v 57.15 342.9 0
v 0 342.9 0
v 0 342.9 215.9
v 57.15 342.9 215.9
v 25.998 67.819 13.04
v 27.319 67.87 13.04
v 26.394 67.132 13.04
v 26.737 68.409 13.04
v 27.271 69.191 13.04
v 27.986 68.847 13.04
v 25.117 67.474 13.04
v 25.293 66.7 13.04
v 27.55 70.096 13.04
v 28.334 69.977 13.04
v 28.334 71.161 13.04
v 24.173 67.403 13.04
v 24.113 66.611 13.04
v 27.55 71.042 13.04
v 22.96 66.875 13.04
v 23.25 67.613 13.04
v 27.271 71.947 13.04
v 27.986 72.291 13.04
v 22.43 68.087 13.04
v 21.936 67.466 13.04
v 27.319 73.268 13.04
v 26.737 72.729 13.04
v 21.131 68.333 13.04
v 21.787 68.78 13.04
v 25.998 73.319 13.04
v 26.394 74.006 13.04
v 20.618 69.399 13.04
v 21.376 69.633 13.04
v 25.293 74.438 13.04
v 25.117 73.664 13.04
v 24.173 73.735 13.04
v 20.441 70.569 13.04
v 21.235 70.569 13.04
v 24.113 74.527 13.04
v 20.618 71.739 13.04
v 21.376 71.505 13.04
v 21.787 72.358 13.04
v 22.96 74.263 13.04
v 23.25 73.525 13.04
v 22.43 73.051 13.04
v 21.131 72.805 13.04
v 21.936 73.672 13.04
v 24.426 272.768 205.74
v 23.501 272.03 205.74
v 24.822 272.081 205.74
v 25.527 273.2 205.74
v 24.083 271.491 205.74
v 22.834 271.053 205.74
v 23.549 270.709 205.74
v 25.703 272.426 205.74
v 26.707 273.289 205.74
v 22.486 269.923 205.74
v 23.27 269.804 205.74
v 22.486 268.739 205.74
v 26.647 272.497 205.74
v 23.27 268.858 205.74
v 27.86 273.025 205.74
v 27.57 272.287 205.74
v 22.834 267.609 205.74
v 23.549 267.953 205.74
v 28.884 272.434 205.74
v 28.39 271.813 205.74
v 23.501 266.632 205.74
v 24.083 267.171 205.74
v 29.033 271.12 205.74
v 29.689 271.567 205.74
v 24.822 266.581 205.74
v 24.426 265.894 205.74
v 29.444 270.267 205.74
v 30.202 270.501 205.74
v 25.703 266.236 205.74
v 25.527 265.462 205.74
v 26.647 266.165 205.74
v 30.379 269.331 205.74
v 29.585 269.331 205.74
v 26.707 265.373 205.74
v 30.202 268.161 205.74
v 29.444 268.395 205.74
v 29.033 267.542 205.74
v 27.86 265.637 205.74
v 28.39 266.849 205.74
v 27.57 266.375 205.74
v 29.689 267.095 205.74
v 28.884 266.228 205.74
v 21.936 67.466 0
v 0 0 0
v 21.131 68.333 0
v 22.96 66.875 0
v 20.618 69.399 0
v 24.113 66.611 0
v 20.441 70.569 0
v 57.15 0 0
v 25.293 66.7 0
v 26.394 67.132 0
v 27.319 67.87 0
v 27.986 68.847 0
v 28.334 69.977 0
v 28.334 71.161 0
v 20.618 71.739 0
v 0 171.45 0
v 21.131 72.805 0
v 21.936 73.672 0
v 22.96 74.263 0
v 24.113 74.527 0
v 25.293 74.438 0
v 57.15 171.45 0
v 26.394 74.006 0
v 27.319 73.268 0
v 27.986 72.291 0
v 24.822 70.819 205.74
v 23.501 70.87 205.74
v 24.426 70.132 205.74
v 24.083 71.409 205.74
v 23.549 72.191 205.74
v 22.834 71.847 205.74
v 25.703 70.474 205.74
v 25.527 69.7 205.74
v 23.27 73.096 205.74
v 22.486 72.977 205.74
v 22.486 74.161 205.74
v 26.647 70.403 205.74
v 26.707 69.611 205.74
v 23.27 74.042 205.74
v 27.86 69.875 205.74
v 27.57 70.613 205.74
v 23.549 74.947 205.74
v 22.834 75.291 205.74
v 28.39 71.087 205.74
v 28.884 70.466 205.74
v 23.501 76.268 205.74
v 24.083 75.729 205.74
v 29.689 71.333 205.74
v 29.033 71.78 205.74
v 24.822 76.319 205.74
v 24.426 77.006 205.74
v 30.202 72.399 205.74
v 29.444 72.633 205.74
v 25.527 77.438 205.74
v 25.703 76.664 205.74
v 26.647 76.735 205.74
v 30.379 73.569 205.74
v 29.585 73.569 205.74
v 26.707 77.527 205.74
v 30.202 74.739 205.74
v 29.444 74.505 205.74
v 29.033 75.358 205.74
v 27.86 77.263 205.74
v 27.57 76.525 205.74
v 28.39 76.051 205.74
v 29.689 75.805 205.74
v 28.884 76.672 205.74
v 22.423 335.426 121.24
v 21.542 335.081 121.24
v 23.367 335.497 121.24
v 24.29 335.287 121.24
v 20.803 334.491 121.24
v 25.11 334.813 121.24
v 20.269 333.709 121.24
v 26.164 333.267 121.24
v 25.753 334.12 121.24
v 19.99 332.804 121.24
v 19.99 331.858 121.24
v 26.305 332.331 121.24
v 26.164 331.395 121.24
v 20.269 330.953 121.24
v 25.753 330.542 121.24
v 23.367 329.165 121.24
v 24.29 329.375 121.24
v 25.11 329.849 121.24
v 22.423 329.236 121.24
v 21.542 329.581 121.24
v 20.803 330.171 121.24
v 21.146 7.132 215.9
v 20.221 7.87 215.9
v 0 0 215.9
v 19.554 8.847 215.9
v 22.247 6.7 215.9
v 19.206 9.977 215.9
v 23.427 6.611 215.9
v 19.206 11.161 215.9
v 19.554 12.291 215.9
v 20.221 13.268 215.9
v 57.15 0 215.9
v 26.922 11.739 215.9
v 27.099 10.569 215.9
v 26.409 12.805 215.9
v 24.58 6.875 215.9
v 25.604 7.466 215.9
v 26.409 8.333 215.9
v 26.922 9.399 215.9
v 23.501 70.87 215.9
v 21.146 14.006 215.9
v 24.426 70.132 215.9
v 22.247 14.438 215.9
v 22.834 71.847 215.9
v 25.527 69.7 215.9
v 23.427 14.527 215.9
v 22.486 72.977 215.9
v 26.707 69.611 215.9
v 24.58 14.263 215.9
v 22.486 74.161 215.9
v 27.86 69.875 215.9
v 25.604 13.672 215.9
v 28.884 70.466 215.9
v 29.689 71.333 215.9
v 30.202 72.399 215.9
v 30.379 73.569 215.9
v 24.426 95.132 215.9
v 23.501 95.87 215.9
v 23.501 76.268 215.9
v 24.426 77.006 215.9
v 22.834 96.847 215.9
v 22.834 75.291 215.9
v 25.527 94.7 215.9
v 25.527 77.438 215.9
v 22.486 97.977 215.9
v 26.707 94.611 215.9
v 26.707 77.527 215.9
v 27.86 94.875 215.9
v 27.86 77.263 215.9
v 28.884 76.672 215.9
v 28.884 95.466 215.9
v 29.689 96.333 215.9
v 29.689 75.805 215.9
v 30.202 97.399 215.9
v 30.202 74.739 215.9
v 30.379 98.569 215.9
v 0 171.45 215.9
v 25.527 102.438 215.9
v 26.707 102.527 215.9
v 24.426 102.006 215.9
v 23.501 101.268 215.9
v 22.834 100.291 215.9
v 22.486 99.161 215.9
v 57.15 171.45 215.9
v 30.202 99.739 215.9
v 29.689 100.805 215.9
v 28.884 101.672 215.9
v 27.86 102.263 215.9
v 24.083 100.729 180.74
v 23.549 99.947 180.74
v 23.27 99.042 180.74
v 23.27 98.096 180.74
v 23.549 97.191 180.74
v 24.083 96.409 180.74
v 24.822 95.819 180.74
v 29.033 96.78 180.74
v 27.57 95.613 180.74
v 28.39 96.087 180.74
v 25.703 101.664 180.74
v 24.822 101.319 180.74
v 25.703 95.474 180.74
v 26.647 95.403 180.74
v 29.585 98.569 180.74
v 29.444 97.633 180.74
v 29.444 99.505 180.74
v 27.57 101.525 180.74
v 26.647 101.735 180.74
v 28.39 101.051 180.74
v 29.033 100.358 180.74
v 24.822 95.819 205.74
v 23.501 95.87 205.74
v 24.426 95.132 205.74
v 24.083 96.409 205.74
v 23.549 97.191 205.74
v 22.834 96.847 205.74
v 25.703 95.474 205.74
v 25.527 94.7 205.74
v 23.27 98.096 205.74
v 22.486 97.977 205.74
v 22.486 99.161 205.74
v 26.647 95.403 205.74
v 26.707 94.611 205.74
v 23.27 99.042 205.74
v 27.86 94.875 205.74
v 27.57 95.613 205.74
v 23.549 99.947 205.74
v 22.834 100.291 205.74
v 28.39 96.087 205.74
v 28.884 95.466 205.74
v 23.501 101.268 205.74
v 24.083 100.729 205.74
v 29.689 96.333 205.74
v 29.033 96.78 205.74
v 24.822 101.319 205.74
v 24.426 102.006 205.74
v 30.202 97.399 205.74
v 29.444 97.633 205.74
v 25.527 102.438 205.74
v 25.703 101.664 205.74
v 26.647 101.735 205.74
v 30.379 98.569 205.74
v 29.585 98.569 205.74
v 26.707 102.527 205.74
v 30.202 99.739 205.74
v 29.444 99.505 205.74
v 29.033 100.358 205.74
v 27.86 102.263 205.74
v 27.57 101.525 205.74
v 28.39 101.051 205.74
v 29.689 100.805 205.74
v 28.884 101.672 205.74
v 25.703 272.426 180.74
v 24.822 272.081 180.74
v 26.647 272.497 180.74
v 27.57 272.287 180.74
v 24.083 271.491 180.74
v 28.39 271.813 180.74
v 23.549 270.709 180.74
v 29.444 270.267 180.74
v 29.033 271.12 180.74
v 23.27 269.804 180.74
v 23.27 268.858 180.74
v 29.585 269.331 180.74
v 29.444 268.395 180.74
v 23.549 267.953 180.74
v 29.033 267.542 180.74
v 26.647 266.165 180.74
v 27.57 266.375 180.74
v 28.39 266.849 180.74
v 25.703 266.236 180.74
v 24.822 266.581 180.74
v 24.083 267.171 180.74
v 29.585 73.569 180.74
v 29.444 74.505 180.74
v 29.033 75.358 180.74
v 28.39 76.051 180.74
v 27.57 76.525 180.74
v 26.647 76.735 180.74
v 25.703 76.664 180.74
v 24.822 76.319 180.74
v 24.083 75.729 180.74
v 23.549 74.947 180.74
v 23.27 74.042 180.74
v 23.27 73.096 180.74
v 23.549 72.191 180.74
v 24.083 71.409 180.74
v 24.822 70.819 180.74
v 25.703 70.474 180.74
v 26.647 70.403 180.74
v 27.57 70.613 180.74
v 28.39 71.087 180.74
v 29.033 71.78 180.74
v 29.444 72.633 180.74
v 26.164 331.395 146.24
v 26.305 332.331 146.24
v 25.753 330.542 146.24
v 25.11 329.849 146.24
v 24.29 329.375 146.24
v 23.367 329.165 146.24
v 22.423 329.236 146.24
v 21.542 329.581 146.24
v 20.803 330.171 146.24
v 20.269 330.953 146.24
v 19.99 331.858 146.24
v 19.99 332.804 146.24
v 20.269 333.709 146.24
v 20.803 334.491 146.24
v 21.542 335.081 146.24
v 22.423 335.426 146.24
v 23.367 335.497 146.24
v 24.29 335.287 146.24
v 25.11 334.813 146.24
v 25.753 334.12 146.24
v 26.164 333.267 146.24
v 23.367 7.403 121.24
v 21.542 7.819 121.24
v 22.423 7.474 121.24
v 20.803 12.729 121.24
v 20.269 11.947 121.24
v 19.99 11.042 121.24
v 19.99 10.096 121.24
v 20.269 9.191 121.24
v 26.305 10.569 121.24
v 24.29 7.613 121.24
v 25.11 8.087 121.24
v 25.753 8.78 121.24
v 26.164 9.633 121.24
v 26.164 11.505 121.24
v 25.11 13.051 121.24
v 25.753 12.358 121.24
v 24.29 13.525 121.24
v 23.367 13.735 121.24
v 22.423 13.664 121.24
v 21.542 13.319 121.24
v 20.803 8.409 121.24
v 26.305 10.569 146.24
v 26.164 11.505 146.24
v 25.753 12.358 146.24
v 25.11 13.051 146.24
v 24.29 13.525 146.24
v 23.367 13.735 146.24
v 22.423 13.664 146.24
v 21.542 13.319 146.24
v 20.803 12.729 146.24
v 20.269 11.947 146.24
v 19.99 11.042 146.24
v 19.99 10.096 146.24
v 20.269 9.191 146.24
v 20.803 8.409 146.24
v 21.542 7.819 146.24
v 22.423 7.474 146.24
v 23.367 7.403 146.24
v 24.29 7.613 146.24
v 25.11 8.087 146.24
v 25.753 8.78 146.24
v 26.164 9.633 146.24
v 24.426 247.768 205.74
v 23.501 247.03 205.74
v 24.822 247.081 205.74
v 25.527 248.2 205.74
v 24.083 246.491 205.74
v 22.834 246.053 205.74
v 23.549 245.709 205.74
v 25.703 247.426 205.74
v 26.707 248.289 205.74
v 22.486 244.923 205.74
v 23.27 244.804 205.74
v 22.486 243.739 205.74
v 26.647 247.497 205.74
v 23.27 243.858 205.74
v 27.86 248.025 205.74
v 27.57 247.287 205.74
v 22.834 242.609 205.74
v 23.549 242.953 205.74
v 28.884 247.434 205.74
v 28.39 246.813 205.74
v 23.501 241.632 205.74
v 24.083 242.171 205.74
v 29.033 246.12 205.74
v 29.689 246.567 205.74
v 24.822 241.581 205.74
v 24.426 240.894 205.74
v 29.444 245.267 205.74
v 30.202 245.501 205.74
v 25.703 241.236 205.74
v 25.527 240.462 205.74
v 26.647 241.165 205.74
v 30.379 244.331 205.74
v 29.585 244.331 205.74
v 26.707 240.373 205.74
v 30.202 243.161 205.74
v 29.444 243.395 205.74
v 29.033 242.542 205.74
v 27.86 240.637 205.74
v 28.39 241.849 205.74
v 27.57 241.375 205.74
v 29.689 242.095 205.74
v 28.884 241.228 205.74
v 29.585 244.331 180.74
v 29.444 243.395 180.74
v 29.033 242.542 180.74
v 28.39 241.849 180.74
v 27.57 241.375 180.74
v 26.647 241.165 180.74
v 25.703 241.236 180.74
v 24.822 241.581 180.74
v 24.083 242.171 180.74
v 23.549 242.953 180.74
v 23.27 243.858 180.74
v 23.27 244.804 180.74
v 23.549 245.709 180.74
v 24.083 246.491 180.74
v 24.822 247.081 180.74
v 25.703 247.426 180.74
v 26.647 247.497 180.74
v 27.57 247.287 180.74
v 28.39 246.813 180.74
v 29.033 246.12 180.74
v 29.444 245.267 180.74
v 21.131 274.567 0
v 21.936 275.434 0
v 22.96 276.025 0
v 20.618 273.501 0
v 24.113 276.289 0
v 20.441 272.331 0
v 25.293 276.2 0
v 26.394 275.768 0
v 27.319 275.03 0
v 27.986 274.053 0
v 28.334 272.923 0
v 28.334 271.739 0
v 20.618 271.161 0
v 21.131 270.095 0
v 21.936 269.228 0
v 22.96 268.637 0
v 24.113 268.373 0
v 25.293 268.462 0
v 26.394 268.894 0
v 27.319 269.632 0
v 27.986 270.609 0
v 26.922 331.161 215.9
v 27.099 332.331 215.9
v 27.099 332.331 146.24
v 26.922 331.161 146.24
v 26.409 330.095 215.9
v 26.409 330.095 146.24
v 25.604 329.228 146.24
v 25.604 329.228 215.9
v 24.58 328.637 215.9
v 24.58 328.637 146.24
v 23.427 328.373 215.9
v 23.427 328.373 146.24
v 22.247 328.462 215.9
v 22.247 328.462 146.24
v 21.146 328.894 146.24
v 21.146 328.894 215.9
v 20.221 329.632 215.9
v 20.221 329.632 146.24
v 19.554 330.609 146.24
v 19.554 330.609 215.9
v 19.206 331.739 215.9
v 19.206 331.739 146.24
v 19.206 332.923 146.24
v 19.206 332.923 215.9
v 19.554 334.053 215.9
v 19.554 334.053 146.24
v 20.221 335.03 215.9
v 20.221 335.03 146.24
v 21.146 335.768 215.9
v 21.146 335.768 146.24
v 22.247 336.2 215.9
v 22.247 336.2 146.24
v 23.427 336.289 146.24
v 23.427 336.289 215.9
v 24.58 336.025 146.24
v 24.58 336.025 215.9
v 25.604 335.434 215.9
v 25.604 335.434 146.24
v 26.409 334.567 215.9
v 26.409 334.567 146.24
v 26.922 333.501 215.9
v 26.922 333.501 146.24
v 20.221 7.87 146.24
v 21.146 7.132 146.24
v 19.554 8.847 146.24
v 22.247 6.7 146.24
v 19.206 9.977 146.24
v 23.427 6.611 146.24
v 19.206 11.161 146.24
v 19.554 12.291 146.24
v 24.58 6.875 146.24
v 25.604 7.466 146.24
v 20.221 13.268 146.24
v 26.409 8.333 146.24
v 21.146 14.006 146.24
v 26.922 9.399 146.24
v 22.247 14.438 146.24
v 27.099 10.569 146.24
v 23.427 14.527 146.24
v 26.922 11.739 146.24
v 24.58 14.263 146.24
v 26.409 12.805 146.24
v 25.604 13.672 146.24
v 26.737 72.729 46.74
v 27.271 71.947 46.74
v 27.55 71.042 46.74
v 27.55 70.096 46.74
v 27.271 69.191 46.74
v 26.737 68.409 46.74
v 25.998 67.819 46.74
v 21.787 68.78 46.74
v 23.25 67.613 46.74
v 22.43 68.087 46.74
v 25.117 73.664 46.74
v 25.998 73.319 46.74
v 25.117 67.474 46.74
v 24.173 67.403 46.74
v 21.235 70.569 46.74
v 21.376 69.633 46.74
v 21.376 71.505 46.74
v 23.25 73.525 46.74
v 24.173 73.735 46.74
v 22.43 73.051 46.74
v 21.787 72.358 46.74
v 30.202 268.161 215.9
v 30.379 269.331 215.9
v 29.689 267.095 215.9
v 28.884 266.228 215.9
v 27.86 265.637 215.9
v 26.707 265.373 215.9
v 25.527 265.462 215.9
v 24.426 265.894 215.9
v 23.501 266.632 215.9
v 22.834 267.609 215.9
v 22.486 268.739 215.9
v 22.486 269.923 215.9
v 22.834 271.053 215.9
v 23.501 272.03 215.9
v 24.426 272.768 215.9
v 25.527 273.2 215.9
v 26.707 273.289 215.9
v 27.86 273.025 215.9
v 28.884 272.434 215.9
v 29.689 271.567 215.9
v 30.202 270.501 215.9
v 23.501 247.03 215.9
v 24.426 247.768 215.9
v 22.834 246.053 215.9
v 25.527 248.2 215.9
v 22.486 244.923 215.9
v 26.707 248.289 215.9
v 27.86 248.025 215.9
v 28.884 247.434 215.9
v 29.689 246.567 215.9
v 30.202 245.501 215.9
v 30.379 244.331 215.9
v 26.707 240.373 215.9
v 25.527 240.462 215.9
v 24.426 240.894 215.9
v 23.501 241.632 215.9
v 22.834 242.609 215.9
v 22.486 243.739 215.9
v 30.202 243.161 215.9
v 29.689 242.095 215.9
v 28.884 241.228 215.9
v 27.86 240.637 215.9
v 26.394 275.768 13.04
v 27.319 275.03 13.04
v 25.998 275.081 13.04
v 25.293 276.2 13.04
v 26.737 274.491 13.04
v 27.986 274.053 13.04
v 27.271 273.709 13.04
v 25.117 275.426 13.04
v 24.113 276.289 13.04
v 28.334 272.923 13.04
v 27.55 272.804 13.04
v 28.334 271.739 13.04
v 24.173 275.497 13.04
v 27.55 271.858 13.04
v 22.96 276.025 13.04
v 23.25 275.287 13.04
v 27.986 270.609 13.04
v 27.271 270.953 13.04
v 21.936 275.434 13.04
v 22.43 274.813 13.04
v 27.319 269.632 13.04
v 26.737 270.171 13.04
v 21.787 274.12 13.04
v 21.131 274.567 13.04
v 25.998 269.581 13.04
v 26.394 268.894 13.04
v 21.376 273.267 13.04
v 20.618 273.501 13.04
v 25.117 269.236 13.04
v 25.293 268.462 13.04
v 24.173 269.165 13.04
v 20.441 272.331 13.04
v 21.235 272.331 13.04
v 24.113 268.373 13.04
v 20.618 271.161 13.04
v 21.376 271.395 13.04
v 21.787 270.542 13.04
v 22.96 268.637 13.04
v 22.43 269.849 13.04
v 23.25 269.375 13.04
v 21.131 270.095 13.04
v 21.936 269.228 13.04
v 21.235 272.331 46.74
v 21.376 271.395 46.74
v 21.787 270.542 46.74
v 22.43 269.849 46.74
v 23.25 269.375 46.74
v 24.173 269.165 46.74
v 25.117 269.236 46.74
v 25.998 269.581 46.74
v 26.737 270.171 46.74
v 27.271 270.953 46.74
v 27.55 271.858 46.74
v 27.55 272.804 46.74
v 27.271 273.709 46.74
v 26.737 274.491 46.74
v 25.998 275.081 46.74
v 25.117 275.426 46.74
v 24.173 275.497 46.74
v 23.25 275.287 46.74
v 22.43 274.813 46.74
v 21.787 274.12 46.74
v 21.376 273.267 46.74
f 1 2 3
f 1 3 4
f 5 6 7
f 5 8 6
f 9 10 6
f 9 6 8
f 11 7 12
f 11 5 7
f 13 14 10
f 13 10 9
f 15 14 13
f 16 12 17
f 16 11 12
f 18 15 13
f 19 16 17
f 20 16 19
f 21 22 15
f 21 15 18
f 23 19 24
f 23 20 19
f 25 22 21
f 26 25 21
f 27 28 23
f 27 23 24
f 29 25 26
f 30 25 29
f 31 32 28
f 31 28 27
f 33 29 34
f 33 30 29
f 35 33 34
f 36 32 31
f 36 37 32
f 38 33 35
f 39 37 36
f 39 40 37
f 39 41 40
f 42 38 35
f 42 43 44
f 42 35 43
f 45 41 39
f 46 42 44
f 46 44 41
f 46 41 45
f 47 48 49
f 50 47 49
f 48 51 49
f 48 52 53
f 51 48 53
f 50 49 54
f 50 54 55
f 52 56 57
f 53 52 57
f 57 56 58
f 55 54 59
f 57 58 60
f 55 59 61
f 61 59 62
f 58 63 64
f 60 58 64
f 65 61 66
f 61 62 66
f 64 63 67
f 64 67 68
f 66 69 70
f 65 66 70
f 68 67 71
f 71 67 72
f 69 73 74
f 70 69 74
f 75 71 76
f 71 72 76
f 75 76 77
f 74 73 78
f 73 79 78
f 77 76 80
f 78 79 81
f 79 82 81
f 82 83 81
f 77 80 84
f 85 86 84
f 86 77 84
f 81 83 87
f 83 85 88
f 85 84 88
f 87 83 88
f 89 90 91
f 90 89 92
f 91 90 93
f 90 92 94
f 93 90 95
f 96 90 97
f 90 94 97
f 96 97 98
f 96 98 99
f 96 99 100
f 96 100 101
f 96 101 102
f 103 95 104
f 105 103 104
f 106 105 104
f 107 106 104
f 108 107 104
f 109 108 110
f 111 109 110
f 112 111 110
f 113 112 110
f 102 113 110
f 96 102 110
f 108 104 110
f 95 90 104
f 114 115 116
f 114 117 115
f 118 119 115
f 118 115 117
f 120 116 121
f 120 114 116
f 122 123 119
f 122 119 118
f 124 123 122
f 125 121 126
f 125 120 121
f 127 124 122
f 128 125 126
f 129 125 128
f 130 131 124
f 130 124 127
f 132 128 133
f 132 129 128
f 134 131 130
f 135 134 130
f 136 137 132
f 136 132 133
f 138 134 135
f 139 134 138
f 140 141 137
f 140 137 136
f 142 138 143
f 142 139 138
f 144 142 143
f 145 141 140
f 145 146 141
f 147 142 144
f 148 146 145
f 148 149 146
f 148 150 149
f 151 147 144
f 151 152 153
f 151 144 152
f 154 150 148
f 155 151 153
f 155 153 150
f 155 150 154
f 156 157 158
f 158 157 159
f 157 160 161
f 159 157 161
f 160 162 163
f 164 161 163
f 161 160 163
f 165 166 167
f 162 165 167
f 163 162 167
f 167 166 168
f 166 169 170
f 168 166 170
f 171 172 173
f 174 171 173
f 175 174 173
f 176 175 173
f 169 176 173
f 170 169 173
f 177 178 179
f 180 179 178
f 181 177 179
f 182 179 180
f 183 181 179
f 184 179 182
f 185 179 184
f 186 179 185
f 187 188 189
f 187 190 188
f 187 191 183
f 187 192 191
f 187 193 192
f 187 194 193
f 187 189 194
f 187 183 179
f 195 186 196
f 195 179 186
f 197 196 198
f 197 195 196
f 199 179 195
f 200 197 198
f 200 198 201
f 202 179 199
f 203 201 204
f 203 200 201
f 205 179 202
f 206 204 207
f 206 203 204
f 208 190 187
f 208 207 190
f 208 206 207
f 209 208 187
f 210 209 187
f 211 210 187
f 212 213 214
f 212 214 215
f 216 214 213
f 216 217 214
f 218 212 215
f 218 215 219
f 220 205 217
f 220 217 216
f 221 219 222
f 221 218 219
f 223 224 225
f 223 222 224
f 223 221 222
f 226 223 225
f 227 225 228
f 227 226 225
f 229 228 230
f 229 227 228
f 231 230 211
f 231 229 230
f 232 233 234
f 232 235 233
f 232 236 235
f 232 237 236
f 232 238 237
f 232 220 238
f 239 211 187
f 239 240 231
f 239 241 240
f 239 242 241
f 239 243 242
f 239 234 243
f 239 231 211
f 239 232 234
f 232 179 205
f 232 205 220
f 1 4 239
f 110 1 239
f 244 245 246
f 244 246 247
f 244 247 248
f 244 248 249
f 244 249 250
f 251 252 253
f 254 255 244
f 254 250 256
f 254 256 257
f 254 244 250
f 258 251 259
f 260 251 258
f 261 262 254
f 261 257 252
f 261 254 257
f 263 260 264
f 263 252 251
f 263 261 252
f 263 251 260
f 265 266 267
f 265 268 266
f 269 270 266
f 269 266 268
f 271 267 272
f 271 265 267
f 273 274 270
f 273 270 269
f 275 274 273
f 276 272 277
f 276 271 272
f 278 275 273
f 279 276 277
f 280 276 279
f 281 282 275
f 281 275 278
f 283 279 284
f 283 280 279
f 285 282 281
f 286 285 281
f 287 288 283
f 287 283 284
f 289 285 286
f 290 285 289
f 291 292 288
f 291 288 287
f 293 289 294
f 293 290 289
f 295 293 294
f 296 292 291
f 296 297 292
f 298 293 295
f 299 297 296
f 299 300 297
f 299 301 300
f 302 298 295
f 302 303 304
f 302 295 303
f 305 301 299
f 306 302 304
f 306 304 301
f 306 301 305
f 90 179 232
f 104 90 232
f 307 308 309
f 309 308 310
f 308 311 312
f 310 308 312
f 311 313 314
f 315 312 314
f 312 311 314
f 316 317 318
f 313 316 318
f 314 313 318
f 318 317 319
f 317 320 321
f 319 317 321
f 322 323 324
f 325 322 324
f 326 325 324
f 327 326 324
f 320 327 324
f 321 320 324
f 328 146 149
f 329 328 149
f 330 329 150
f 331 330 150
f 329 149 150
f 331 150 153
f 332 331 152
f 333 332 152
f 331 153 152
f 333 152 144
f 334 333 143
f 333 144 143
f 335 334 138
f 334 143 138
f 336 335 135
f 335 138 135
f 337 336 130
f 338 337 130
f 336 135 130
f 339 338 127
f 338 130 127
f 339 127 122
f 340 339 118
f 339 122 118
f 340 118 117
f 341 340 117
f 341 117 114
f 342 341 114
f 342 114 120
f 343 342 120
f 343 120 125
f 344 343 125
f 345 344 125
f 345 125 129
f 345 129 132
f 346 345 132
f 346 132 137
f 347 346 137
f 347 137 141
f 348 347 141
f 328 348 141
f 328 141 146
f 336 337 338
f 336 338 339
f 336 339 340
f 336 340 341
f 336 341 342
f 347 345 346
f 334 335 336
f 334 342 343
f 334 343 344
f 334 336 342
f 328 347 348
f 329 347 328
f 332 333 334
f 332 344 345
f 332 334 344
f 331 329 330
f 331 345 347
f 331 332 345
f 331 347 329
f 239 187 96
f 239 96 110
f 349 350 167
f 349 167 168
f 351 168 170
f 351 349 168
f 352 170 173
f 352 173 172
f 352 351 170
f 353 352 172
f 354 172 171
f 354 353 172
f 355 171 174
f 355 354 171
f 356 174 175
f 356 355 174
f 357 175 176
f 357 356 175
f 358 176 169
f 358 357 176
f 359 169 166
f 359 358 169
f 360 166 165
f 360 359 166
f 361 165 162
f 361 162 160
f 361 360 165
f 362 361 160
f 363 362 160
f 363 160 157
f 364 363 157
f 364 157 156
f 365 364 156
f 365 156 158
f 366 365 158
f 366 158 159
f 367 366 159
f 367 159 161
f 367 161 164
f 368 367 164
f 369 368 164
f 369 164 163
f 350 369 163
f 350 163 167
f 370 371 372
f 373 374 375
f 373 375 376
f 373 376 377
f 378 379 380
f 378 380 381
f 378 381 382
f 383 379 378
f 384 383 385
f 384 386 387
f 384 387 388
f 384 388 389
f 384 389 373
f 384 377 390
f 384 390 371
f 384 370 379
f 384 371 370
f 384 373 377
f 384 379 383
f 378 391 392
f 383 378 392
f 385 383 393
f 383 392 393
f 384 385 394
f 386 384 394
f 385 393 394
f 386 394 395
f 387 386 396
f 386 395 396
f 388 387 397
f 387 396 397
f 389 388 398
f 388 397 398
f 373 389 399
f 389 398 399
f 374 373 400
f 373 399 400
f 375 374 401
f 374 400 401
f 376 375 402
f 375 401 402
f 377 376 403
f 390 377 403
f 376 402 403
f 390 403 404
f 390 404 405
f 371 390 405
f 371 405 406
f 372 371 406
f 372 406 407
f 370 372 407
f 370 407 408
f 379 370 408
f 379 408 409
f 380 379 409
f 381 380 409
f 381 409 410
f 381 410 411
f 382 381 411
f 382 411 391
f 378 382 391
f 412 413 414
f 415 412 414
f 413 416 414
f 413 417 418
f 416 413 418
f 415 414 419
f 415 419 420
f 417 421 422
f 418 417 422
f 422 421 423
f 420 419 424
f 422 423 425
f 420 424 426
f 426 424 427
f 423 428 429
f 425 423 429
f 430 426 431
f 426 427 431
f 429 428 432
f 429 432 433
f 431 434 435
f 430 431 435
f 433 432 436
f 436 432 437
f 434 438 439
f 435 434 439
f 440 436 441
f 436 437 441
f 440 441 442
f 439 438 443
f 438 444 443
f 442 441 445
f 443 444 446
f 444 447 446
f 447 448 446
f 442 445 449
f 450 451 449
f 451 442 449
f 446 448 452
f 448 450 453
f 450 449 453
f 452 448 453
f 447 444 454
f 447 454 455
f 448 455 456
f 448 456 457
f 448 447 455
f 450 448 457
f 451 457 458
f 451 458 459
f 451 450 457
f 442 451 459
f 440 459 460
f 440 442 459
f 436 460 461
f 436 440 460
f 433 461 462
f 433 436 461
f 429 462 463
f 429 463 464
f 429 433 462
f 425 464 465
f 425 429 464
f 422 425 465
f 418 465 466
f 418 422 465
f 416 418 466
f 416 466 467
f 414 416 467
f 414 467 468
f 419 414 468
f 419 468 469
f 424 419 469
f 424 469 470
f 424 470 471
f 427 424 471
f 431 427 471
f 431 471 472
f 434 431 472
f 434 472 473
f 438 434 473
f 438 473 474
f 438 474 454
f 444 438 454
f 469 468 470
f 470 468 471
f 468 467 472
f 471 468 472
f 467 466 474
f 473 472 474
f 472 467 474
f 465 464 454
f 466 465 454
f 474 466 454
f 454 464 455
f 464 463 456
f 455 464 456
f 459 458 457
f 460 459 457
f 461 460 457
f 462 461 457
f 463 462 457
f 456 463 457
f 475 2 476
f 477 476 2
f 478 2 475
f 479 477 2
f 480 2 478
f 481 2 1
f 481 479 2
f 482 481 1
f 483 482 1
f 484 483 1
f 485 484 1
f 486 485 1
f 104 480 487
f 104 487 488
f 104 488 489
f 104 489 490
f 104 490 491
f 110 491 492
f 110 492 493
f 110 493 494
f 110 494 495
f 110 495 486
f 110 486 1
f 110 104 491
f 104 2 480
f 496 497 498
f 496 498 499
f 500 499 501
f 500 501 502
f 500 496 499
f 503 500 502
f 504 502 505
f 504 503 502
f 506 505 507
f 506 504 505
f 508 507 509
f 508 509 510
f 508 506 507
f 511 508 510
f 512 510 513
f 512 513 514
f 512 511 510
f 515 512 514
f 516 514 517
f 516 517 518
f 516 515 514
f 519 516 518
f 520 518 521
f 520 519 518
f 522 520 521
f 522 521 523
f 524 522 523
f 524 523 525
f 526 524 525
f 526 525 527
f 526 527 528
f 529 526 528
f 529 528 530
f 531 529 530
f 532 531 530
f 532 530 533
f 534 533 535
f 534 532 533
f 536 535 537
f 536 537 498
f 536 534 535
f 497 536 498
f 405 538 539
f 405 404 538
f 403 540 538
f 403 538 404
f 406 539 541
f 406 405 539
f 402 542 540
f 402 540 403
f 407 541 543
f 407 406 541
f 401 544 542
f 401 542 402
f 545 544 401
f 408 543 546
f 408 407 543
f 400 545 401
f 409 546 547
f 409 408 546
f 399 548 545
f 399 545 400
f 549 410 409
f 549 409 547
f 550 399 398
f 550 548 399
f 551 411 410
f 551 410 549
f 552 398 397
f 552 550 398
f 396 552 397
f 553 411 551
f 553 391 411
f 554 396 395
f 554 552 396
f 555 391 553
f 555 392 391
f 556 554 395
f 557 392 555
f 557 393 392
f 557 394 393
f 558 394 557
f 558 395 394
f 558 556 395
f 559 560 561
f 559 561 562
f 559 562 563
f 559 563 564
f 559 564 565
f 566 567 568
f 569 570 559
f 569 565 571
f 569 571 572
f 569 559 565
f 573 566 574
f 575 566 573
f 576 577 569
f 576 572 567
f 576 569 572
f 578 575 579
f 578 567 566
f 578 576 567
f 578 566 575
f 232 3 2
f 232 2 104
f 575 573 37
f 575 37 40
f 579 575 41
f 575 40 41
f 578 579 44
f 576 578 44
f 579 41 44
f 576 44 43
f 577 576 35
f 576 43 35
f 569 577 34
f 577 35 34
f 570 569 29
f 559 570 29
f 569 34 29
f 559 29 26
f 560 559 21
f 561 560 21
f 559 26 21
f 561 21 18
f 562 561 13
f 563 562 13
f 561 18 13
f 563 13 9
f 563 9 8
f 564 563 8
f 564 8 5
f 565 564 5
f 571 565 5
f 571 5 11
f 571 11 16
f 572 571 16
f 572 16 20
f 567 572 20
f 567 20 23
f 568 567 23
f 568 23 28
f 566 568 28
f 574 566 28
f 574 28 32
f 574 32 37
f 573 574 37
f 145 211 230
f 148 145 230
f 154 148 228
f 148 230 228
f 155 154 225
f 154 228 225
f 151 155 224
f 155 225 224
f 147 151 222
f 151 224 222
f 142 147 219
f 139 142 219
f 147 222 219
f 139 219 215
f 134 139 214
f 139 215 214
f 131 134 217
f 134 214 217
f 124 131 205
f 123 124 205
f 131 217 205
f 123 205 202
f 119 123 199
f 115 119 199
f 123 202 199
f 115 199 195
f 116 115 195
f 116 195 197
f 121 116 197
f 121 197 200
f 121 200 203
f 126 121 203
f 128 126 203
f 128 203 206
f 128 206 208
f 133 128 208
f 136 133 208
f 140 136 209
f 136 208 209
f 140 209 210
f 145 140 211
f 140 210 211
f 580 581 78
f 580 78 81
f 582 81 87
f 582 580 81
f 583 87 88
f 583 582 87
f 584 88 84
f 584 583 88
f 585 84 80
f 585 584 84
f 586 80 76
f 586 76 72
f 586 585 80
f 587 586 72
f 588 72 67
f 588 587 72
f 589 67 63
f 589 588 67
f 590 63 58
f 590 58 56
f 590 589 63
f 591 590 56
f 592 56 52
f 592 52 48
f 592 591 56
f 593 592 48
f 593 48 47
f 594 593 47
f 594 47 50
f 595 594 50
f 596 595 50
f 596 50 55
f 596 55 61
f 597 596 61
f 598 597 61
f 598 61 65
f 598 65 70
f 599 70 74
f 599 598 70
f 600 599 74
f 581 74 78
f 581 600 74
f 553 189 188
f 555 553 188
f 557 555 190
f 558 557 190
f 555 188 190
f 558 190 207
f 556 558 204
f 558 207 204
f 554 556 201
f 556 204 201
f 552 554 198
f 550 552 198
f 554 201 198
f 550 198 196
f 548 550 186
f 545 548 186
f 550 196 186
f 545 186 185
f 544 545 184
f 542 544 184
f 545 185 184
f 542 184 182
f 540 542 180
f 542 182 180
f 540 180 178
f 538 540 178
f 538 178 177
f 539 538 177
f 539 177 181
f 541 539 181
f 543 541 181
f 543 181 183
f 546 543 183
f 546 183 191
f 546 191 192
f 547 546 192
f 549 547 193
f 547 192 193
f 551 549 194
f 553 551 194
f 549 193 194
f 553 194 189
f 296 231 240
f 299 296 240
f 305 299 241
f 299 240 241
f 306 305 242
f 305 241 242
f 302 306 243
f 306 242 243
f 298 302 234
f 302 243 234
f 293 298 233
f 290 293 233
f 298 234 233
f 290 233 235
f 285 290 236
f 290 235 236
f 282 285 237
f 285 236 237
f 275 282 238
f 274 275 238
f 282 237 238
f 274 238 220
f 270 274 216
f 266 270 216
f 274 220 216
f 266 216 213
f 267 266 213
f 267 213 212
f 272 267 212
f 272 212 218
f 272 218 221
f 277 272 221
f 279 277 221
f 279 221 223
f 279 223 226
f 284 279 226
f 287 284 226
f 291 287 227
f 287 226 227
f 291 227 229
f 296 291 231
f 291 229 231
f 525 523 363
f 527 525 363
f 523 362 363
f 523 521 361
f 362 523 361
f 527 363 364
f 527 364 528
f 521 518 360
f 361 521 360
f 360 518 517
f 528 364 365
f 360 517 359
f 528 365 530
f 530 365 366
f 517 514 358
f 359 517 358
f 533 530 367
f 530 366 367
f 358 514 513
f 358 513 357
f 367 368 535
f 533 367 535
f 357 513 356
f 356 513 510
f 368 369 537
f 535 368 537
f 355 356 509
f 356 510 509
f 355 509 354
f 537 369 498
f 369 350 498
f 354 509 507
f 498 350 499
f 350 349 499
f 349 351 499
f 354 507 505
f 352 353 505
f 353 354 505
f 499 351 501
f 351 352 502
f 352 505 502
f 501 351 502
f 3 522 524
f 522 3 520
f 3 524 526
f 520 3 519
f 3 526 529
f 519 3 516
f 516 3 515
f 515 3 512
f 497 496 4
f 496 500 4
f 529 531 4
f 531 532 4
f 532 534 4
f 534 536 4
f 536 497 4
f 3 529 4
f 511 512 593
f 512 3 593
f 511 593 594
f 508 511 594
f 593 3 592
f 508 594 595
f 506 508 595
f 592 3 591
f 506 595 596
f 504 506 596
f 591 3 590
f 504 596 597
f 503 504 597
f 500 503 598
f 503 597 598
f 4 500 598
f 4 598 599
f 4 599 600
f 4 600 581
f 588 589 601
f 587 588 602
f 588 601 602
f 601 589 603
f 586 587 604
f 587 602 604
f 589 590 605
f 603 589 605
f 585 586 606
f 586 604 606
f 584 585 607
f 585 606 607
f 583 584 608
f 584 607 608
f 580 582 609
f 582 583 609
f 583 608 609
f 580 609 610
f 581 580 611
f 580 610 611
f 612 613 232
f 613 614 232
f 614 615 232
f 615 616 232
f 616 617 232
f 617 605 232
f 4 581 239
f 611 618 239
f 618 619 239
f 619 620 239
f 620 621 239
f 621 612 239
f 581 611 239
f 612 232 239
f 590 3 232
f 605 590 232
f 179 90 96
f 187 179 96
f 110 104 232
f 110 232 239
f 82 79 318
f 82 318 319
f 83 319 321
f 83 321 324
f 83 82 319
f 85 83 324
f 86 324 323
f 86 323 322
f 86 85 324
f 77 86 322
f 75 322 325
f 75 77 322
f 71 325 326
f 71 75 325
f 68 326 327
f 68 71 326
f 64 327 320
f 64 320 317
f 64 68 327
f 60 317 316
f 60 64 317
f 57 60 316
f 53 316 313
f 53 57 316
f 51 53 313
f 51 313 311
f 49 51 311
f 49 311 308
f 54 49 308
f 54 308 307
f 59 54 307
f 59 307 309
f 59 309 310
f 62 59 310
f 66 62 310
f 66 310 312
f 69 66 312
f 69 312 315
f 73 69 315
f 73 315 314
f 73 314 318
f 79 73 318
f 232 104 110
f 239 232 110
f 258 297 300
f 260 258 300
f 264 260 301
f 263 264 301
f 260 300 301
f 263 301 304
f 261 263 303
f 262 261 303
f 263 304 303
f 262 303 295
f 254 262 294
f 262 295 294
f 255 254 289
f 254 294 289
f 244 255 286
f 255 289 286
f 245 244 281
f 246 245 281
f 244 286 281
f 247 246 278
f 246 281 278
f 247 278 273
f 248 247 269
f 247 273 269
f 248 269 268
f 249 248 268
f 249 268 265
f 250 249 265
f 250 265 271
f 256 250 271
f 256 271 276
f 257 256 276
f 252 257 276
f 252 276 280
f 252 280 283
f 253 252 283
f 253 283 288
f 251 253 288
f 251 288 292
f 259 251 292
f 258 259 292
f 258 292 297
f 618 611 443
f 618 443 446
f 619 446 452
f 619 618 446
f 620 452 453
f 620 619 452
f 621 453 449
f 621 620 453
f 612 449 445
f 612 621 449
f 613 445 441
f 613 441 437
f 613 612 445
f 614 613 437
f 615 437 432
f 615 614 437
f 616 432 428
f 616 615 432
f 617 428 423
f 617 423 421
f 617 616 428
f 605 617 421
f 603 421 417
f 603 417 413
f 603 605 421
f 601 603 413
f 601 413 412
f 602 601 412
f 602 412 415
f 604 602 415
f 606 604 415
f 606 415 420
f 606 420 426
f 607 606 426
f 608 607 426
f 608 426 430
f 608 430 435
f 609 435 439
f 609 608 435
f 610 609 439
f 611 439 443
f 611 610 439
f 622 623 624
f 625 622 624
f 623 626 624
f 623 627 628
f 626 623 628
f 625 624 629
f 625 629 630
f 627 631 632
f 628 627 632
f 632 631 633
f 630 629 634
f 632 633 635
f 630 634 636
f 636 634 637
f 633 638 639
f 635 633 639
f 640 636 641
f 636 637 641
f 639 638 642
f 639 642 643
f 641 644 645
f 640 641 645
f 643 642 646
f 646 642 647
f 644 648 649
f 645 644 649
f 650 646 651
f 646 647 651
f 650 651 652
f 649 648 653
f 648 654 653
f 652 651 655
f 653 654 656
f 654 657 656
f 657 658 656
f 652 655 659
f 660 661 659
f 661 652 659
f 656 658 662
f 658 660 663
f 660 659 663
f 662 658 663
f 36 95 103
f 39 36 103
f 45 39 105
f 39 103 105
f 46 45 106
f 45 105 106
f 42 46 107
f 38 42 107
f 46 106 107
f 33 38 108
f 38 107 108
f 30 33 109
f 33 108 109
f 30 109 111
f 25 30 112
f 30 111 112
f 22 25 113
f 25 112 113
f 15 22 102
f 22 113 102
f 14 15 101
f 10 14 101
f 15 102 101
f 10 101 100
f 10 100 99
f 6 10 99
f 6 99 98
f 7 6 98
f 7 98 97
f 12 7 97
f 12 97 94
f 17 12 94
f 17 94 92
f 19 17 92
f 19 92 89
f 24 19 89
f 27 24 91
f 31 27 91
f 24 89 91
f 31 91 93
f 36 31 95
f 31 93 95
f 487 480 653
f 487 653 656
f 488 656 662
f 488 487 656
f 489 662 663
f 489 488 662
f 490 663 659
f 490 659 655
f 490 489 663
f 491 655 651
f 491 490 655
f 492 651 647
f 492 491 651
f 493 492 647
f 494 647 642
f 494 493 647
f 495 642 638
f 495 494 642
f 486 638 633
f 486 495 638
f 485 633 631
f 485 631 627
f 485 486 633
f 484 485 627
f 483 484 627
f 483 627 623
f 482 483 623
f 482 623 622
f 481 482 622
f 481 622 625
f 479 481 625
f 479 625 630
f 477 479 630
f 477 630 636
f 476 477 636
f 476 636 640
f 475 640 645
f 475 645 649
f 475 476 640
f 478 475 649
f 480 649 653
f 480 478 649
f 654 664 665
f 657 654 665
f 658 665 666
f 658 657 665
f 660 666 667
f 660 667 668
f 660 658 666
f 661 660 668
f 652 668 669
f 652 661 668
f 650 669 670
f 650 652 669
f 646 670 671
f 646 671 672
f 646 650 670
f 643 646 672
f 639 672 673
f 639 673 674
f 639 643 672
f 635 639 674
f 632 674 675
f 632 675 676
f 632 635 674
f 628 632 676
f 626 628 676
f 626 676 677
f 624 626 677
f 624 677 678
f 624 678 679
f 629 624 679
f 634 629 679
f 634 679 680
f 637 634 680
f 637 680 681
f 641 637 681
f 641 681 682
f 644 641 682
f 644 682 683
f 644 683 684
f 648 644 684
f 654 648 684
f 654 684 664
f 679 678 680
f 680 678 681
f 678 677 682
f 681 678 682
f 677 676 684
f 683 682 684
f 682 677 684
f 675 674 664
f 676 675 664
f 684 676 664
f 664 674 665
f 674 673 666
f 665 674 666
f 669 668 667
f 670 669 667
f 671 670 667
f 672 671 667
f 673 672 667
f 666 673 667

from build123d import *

# Parameters (mm, degrees)
SKETCH1_W           = 57.15
SKETCH1_H           = 171.45
BOSS_EXTRUDE1_DEPTH = 215.9
SKETCH2_R           = 3.175
CUT_EXTRUDE1_DEPTH  = 46.7399878
SKETCH3_R           = 3.96875
CUT_EXTRUDE2_DEPTH  = 13.0400044
SKETCH4_R           = 3.175
CUT_EXTRUDE3_DEPTH  = 35.1600008
SKETCH5_R           = 3.175
CUT_EXTRUDE4_DEPTH  = 94.6600088
SKETCH6_R           = 3.96875
CUT_EXTRUDE5_DEPTH  = 10.16
SKETCH7_R           = 3.96875
CUT_EXTRUDE6_DEPTH  = 69.660008


with BuildPart() as part:
    # Sketch1 → Boss-Extrude1 (new body)
    with BuildSketch(Plane.XY):
        with Locations((28.575, 85.725)):
            Rectangle(SKETCH1_W, SKETCH1_H)
    extrude(amount=BOSS_EXTRUDE1_DEPTH)

    # Sketch2 → Cut-Extrude1 (cut)
    with BuildSketch(Plane(origin=(0, 0, 0), x_dir=(-1, 0, 0), z_dir=(0, 0, -1))):
        with Locations((-24.41, 70.569)):
            Circle(SKETCH2_R)
    extrude(amount=-CUT_EXTRUDE1_DEPTH, mode=Mode.SUBTRACT)

    # Sketch3 → Cut-Extrude2 (cut)
    with BuildSketch(Plane(origin=(0, 0, 0), x_dir=(-1, 0, 0), z_dir=(0, 0, -1))):
        with Locations((-24.41, 70.569)):
            Circle(SKETCH3_R)
    extrude(amount=-CUT_EXTRUDE2_DEPTH, mode=Mode.SUBTRACT)

    # Sketch4 → Cut-Extrude3 (cut)
    with BuildSketch(Plane.XY.offset(215.9)):
        with Locations((26.41, 73.569)):
            Circle(SKETCH4_R)
        with Locations((26.41, 98.569)):
            Circle(SKETCH4_R)
    extrude(amount=-CUT_EXTRUDE3_DEPTH, mode=Mode.SUBTRACT)

    # Sketch5 → Cut-Extrude4 (cut)
    with BuildSketch(Plane.XY.offset(215.9)):
        with Locations((23.13, 10.569)):
            Circle(SKETCH5_R)
    extrude(amount=-CUT_EXTRUDE4_DEPTH, mode=Mode.SUBTRACT)

    # Sketch6 → Cut-Extrude5 (cut)
    with BuildSketch(Plane.XY.offset(215.9)):
        with Locations((26.41, 73.569)):
            Circle(SKETCH6_R)
        with Locations((26.41, 98.569)):
            Circle(SKETCH6_R)
    extrude(amount=-CUT_EXTRUDE5_DEPTH, mode=Mode.SUBTRACT)

    # Sketch7 → Cut-Extrude6 (cut)
    with BuildSketch(Plane.XY.offset(215.9)):
        with Locations((23.13, 10.569)):
            Circle(SKETCH7_R)
    extrude(amount=-CUT_EXTRUDE6_DEPTH, mode=Mode.SUBTRACT)


with BuildPart() as body_2:
    # Mirror2: mirrored copy
    add(part.part.mirror(Plane(origin=(0, 171.45, 215.9), x_dir=(0, 0, 1), z_dir=(0, -1, 0))))


solid = Compound([part.part, body_2.part])
